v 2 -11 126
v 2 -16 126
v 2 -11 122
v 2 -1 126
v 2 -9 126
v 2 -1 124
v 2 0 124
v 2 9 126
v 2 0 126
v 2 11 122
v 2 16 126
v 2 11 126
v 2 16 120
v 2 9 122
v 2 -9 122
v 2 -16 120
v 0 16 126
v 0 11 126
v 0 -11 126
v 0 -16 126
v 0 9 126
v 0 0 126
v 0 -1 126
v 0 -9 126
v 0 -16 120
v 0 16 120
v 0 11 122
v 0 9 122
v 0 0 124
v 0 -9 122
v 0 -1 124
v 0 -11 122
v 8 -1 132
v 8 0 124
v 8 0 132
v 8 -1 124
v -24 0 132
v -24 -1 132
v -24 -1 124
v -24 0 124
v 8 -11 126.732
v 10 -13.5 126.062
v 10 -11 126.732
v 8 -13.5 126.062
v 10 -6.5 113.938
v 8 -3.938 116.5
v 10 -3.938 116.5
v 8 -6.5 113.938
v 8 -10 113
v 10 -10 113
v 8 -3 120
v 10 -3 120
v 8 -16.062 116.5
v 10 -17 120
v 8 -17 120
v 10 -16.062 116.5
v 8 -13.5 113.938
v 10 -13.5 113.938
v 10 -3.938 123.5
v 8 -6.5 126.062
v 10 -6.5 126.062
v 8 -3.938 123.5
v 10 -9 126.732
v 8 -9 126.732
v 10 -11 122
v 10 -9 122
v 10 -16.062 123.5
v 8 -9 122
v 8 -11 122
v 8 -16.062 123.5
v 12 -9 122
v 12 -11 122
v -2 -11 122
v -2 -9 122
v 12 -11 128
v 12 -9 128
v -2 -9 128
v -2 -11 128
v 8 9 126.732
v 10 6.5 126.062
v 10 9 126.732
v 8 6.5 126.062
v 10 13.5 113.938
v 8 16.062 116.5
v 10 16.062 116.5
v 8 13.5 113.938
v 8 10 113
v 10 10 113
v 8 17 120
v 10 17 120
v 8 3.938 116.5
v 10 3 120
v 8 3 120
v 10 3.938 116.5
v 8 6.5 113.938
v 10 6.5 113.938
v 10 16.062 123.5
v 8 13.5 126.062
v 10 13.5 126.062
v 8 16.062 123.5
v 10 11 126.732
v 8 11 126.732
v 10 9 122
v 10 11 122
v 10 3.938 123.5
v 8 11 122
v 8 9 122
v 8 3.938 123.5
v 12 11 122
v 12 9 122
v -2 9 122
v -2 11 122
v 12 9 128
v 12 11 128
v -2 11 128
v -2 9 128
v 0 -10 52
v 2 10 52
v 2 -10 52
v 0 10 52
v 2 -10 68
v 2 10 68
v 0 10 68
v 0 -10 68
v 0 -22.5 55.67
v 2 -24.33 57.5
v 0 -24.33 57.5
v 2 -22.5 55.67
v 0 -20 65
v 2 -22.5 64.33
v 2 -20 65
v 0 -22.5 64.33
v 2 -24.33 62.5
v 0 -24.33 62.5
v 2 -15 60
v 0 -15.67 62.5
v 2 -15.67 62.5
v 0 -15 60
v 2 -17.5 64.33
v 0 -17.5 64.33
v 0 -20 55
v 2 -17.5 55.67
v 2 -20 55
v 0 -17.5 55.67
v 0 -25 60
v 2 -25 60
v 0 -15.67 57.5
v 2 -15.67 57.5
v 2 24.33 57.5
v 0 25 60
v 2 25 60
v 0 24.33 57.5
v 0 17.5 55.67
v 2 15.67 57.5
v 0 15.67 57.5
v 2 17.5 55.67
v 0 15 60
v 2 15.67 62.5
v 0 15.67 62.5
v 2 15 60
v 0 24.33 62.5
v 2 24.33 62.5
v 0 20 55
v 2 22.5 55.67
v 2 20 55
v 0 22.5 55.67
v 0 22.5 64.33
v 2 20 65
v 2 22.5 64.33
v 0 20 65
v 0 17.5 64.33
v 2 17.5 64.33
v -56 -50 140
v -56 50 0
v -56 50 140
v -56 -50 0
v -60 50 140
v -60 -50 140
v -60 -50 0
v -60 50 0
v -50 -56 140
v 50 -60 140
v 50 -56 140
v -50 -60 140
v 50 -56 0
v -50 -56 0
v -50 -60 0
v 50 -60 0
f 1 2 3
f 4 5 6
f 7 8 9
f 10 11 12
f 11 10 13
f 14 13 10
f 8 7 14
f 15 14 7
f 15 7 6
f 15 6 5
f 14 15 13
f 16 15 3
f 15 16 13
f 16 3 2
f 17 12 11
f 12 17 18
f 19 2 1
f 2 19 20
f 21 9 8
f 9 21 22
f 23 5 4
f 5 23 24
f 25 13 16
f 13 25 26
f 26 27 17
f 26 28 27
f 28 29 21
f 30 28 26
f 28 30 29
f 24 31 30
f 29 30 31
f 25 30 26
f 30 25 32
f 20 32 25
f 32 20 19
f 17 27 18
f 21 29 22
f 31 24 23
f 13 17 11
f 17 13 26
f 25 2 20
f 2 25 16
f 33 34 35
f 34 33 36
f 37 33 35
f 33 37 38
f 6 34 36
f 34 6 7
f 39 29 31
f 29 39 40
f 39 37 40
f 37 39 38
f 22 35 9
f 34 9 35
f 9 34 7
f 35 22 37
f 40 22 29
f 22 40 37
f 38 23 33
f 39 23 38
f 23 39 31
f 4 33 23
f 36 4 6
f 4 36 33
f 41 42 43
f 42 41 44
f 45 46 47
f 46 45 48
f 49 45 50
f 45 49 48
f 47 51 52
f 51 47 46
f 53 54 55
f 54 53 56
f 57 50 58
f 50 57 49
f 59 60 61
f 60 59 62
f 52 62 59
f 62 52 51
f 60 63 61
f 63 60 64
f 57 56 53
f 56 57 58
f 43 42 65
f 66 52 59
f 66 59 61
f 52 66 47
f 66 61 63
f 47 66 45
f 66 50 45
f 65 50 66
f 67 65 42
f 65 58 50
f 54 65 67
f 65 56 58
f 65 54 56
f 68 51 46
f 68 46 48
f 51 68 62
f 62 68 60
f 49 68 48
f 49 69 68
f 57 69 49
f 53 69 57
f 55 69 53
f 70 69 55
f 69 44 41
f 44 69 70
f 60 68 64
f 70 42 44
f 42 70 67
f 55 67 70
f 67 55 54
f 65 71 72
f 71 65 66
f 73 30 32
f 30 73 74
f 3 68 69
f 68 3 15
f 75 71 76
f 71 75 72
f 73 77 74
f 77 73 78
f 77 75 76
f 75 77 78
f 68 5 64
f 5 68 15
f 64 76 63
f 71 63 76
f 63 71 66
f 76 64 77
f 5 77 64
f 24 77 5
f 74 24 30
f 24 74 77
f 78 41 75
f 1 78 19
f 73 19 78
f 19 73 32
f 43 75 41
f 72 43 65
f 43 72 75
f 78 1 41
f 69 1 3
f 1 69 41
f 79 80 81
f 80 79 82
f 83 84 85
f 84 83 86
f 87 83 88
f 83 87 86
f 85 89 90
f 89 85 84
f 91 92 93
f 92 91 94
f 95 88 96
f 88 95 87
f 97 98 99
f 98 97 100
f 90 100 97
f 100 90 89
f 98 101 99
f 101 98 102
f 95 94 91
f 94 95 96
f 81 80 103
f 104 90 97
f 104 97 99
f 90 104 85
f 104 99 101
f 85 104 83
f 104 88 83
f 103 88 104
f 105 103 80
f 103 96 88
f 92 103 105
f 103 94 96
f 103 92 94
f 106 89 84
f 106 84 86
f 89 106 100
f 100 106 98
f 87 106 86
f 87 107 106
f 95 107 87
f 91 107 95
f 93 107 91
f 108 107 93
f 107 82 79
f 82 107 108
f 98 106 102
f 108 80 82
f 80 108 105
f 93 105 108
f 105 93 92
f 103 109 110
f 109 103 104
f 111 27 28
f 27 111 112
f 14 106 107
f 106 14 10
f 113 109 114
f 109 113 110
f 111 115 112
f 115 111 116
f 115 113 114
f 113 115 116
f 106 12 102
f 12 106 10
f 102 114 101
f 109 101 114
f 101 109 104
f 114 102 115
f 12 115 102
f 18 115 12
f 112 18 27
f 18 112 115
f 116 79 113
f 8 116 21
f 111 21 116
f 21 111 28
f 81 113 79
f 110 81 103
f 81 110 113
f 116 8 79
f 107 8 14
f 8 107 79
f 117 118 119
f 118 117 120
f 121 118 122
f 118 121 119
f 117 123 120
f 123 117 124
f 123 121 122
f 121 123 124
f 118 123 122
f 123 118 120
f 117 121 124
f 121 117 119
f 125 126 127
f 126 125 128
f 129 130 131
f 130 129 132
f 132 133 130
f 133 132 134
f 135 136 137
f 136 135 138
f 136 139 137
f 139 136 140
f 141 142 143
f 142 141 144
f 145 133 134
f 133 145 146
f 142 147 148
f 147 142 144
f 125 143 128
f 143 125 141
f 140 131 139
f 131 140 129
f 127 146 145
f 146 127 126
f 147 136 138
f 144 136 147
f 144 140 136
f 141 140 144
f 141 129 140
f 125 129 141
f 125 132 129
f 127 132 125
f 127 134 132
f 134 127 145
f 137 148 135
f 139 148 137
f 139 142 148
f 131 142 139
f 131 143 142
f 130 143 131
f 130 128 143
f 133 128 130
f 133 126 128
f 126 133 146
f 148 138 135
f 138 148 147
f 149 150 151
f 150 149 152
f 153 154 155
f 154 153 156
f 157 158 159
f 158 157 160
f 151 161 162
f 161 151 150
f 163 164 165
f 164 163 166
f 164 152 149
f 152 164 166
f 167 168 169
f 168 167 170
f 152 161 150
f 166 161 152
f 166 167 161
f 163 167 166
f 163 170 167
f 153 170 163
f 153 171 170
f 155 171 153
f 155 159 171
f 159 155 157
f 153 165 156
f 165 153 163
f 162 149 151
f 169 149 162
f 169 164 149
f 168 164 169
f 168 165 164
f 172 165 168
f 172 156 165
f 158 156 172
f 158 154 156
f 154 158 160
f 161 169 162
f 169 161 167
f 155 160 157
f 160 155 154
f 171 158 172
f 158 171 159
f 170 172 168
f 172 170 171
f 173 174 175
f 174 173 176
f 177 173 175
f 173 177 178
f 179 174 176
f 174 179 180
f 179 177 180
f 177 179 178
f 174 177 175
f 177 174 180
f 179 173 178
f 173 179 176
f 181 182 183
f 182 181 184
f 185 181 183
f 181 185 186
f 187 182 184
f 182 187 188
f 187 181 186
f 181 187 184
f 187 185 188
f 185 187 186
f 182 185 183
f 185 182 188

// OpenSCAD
// ###############################################
// basic good one
// ###############################################

// variables #####################################

$fn=12;
thck = 2;
dtck = 1;

// elements ######################################

module eye() {
  union() {
    color([0.4,0.5,0,1]) cylinder(h=thck,r=7,c8enter=false);
    translate([-8,-dtck,-10])
    cube([6,thck,14],center=false);
  }
}

module forehead() {
  union() {
    translate([0,-16,0])
    cube([thck,32,6],center=false);
    //
    translate([-24,-dtck,4])
    cube([32,dtck,8],center=false);
    //
  }
}

module torso() {
  //
  //
}

// assembly ######################################

module assembly() {
  //
  // head
  //
  translate([0,0,120])
  union() {
    //
    forehead();
    translate([8,0,0]) rotate([0,90,0]) {
      translate([0,-10,0]) eye();
      translate([0,10,0]) eye();
    }
    //
  }
  //
  // torso
  //
  // arms
  //
  // hips
  //
  translate([0,0,60])
  rotate([0,90,0])
  translate([-8,-10,0])
  cube([16,20,thck],center=false);
  //
  translate([0,-20,60])
  rotate([0,90,0])
  cylinder(h=thck,r=5,center=false);
  translate([0,20,60])
  rotate([0,90,0])
  cylinder(h=thck,r=5,center=false);
  //
  // legs
  //
}

assembly();

// helpers #######################################

translate([-60,-50,0]) cube([4,100,140],center=false);
translate([50,-60,0]) rotate([0,0,90]) cube([4,100,140],center=false);
//translate([-50,-50,0]) cube([100,100,140],center=false);
